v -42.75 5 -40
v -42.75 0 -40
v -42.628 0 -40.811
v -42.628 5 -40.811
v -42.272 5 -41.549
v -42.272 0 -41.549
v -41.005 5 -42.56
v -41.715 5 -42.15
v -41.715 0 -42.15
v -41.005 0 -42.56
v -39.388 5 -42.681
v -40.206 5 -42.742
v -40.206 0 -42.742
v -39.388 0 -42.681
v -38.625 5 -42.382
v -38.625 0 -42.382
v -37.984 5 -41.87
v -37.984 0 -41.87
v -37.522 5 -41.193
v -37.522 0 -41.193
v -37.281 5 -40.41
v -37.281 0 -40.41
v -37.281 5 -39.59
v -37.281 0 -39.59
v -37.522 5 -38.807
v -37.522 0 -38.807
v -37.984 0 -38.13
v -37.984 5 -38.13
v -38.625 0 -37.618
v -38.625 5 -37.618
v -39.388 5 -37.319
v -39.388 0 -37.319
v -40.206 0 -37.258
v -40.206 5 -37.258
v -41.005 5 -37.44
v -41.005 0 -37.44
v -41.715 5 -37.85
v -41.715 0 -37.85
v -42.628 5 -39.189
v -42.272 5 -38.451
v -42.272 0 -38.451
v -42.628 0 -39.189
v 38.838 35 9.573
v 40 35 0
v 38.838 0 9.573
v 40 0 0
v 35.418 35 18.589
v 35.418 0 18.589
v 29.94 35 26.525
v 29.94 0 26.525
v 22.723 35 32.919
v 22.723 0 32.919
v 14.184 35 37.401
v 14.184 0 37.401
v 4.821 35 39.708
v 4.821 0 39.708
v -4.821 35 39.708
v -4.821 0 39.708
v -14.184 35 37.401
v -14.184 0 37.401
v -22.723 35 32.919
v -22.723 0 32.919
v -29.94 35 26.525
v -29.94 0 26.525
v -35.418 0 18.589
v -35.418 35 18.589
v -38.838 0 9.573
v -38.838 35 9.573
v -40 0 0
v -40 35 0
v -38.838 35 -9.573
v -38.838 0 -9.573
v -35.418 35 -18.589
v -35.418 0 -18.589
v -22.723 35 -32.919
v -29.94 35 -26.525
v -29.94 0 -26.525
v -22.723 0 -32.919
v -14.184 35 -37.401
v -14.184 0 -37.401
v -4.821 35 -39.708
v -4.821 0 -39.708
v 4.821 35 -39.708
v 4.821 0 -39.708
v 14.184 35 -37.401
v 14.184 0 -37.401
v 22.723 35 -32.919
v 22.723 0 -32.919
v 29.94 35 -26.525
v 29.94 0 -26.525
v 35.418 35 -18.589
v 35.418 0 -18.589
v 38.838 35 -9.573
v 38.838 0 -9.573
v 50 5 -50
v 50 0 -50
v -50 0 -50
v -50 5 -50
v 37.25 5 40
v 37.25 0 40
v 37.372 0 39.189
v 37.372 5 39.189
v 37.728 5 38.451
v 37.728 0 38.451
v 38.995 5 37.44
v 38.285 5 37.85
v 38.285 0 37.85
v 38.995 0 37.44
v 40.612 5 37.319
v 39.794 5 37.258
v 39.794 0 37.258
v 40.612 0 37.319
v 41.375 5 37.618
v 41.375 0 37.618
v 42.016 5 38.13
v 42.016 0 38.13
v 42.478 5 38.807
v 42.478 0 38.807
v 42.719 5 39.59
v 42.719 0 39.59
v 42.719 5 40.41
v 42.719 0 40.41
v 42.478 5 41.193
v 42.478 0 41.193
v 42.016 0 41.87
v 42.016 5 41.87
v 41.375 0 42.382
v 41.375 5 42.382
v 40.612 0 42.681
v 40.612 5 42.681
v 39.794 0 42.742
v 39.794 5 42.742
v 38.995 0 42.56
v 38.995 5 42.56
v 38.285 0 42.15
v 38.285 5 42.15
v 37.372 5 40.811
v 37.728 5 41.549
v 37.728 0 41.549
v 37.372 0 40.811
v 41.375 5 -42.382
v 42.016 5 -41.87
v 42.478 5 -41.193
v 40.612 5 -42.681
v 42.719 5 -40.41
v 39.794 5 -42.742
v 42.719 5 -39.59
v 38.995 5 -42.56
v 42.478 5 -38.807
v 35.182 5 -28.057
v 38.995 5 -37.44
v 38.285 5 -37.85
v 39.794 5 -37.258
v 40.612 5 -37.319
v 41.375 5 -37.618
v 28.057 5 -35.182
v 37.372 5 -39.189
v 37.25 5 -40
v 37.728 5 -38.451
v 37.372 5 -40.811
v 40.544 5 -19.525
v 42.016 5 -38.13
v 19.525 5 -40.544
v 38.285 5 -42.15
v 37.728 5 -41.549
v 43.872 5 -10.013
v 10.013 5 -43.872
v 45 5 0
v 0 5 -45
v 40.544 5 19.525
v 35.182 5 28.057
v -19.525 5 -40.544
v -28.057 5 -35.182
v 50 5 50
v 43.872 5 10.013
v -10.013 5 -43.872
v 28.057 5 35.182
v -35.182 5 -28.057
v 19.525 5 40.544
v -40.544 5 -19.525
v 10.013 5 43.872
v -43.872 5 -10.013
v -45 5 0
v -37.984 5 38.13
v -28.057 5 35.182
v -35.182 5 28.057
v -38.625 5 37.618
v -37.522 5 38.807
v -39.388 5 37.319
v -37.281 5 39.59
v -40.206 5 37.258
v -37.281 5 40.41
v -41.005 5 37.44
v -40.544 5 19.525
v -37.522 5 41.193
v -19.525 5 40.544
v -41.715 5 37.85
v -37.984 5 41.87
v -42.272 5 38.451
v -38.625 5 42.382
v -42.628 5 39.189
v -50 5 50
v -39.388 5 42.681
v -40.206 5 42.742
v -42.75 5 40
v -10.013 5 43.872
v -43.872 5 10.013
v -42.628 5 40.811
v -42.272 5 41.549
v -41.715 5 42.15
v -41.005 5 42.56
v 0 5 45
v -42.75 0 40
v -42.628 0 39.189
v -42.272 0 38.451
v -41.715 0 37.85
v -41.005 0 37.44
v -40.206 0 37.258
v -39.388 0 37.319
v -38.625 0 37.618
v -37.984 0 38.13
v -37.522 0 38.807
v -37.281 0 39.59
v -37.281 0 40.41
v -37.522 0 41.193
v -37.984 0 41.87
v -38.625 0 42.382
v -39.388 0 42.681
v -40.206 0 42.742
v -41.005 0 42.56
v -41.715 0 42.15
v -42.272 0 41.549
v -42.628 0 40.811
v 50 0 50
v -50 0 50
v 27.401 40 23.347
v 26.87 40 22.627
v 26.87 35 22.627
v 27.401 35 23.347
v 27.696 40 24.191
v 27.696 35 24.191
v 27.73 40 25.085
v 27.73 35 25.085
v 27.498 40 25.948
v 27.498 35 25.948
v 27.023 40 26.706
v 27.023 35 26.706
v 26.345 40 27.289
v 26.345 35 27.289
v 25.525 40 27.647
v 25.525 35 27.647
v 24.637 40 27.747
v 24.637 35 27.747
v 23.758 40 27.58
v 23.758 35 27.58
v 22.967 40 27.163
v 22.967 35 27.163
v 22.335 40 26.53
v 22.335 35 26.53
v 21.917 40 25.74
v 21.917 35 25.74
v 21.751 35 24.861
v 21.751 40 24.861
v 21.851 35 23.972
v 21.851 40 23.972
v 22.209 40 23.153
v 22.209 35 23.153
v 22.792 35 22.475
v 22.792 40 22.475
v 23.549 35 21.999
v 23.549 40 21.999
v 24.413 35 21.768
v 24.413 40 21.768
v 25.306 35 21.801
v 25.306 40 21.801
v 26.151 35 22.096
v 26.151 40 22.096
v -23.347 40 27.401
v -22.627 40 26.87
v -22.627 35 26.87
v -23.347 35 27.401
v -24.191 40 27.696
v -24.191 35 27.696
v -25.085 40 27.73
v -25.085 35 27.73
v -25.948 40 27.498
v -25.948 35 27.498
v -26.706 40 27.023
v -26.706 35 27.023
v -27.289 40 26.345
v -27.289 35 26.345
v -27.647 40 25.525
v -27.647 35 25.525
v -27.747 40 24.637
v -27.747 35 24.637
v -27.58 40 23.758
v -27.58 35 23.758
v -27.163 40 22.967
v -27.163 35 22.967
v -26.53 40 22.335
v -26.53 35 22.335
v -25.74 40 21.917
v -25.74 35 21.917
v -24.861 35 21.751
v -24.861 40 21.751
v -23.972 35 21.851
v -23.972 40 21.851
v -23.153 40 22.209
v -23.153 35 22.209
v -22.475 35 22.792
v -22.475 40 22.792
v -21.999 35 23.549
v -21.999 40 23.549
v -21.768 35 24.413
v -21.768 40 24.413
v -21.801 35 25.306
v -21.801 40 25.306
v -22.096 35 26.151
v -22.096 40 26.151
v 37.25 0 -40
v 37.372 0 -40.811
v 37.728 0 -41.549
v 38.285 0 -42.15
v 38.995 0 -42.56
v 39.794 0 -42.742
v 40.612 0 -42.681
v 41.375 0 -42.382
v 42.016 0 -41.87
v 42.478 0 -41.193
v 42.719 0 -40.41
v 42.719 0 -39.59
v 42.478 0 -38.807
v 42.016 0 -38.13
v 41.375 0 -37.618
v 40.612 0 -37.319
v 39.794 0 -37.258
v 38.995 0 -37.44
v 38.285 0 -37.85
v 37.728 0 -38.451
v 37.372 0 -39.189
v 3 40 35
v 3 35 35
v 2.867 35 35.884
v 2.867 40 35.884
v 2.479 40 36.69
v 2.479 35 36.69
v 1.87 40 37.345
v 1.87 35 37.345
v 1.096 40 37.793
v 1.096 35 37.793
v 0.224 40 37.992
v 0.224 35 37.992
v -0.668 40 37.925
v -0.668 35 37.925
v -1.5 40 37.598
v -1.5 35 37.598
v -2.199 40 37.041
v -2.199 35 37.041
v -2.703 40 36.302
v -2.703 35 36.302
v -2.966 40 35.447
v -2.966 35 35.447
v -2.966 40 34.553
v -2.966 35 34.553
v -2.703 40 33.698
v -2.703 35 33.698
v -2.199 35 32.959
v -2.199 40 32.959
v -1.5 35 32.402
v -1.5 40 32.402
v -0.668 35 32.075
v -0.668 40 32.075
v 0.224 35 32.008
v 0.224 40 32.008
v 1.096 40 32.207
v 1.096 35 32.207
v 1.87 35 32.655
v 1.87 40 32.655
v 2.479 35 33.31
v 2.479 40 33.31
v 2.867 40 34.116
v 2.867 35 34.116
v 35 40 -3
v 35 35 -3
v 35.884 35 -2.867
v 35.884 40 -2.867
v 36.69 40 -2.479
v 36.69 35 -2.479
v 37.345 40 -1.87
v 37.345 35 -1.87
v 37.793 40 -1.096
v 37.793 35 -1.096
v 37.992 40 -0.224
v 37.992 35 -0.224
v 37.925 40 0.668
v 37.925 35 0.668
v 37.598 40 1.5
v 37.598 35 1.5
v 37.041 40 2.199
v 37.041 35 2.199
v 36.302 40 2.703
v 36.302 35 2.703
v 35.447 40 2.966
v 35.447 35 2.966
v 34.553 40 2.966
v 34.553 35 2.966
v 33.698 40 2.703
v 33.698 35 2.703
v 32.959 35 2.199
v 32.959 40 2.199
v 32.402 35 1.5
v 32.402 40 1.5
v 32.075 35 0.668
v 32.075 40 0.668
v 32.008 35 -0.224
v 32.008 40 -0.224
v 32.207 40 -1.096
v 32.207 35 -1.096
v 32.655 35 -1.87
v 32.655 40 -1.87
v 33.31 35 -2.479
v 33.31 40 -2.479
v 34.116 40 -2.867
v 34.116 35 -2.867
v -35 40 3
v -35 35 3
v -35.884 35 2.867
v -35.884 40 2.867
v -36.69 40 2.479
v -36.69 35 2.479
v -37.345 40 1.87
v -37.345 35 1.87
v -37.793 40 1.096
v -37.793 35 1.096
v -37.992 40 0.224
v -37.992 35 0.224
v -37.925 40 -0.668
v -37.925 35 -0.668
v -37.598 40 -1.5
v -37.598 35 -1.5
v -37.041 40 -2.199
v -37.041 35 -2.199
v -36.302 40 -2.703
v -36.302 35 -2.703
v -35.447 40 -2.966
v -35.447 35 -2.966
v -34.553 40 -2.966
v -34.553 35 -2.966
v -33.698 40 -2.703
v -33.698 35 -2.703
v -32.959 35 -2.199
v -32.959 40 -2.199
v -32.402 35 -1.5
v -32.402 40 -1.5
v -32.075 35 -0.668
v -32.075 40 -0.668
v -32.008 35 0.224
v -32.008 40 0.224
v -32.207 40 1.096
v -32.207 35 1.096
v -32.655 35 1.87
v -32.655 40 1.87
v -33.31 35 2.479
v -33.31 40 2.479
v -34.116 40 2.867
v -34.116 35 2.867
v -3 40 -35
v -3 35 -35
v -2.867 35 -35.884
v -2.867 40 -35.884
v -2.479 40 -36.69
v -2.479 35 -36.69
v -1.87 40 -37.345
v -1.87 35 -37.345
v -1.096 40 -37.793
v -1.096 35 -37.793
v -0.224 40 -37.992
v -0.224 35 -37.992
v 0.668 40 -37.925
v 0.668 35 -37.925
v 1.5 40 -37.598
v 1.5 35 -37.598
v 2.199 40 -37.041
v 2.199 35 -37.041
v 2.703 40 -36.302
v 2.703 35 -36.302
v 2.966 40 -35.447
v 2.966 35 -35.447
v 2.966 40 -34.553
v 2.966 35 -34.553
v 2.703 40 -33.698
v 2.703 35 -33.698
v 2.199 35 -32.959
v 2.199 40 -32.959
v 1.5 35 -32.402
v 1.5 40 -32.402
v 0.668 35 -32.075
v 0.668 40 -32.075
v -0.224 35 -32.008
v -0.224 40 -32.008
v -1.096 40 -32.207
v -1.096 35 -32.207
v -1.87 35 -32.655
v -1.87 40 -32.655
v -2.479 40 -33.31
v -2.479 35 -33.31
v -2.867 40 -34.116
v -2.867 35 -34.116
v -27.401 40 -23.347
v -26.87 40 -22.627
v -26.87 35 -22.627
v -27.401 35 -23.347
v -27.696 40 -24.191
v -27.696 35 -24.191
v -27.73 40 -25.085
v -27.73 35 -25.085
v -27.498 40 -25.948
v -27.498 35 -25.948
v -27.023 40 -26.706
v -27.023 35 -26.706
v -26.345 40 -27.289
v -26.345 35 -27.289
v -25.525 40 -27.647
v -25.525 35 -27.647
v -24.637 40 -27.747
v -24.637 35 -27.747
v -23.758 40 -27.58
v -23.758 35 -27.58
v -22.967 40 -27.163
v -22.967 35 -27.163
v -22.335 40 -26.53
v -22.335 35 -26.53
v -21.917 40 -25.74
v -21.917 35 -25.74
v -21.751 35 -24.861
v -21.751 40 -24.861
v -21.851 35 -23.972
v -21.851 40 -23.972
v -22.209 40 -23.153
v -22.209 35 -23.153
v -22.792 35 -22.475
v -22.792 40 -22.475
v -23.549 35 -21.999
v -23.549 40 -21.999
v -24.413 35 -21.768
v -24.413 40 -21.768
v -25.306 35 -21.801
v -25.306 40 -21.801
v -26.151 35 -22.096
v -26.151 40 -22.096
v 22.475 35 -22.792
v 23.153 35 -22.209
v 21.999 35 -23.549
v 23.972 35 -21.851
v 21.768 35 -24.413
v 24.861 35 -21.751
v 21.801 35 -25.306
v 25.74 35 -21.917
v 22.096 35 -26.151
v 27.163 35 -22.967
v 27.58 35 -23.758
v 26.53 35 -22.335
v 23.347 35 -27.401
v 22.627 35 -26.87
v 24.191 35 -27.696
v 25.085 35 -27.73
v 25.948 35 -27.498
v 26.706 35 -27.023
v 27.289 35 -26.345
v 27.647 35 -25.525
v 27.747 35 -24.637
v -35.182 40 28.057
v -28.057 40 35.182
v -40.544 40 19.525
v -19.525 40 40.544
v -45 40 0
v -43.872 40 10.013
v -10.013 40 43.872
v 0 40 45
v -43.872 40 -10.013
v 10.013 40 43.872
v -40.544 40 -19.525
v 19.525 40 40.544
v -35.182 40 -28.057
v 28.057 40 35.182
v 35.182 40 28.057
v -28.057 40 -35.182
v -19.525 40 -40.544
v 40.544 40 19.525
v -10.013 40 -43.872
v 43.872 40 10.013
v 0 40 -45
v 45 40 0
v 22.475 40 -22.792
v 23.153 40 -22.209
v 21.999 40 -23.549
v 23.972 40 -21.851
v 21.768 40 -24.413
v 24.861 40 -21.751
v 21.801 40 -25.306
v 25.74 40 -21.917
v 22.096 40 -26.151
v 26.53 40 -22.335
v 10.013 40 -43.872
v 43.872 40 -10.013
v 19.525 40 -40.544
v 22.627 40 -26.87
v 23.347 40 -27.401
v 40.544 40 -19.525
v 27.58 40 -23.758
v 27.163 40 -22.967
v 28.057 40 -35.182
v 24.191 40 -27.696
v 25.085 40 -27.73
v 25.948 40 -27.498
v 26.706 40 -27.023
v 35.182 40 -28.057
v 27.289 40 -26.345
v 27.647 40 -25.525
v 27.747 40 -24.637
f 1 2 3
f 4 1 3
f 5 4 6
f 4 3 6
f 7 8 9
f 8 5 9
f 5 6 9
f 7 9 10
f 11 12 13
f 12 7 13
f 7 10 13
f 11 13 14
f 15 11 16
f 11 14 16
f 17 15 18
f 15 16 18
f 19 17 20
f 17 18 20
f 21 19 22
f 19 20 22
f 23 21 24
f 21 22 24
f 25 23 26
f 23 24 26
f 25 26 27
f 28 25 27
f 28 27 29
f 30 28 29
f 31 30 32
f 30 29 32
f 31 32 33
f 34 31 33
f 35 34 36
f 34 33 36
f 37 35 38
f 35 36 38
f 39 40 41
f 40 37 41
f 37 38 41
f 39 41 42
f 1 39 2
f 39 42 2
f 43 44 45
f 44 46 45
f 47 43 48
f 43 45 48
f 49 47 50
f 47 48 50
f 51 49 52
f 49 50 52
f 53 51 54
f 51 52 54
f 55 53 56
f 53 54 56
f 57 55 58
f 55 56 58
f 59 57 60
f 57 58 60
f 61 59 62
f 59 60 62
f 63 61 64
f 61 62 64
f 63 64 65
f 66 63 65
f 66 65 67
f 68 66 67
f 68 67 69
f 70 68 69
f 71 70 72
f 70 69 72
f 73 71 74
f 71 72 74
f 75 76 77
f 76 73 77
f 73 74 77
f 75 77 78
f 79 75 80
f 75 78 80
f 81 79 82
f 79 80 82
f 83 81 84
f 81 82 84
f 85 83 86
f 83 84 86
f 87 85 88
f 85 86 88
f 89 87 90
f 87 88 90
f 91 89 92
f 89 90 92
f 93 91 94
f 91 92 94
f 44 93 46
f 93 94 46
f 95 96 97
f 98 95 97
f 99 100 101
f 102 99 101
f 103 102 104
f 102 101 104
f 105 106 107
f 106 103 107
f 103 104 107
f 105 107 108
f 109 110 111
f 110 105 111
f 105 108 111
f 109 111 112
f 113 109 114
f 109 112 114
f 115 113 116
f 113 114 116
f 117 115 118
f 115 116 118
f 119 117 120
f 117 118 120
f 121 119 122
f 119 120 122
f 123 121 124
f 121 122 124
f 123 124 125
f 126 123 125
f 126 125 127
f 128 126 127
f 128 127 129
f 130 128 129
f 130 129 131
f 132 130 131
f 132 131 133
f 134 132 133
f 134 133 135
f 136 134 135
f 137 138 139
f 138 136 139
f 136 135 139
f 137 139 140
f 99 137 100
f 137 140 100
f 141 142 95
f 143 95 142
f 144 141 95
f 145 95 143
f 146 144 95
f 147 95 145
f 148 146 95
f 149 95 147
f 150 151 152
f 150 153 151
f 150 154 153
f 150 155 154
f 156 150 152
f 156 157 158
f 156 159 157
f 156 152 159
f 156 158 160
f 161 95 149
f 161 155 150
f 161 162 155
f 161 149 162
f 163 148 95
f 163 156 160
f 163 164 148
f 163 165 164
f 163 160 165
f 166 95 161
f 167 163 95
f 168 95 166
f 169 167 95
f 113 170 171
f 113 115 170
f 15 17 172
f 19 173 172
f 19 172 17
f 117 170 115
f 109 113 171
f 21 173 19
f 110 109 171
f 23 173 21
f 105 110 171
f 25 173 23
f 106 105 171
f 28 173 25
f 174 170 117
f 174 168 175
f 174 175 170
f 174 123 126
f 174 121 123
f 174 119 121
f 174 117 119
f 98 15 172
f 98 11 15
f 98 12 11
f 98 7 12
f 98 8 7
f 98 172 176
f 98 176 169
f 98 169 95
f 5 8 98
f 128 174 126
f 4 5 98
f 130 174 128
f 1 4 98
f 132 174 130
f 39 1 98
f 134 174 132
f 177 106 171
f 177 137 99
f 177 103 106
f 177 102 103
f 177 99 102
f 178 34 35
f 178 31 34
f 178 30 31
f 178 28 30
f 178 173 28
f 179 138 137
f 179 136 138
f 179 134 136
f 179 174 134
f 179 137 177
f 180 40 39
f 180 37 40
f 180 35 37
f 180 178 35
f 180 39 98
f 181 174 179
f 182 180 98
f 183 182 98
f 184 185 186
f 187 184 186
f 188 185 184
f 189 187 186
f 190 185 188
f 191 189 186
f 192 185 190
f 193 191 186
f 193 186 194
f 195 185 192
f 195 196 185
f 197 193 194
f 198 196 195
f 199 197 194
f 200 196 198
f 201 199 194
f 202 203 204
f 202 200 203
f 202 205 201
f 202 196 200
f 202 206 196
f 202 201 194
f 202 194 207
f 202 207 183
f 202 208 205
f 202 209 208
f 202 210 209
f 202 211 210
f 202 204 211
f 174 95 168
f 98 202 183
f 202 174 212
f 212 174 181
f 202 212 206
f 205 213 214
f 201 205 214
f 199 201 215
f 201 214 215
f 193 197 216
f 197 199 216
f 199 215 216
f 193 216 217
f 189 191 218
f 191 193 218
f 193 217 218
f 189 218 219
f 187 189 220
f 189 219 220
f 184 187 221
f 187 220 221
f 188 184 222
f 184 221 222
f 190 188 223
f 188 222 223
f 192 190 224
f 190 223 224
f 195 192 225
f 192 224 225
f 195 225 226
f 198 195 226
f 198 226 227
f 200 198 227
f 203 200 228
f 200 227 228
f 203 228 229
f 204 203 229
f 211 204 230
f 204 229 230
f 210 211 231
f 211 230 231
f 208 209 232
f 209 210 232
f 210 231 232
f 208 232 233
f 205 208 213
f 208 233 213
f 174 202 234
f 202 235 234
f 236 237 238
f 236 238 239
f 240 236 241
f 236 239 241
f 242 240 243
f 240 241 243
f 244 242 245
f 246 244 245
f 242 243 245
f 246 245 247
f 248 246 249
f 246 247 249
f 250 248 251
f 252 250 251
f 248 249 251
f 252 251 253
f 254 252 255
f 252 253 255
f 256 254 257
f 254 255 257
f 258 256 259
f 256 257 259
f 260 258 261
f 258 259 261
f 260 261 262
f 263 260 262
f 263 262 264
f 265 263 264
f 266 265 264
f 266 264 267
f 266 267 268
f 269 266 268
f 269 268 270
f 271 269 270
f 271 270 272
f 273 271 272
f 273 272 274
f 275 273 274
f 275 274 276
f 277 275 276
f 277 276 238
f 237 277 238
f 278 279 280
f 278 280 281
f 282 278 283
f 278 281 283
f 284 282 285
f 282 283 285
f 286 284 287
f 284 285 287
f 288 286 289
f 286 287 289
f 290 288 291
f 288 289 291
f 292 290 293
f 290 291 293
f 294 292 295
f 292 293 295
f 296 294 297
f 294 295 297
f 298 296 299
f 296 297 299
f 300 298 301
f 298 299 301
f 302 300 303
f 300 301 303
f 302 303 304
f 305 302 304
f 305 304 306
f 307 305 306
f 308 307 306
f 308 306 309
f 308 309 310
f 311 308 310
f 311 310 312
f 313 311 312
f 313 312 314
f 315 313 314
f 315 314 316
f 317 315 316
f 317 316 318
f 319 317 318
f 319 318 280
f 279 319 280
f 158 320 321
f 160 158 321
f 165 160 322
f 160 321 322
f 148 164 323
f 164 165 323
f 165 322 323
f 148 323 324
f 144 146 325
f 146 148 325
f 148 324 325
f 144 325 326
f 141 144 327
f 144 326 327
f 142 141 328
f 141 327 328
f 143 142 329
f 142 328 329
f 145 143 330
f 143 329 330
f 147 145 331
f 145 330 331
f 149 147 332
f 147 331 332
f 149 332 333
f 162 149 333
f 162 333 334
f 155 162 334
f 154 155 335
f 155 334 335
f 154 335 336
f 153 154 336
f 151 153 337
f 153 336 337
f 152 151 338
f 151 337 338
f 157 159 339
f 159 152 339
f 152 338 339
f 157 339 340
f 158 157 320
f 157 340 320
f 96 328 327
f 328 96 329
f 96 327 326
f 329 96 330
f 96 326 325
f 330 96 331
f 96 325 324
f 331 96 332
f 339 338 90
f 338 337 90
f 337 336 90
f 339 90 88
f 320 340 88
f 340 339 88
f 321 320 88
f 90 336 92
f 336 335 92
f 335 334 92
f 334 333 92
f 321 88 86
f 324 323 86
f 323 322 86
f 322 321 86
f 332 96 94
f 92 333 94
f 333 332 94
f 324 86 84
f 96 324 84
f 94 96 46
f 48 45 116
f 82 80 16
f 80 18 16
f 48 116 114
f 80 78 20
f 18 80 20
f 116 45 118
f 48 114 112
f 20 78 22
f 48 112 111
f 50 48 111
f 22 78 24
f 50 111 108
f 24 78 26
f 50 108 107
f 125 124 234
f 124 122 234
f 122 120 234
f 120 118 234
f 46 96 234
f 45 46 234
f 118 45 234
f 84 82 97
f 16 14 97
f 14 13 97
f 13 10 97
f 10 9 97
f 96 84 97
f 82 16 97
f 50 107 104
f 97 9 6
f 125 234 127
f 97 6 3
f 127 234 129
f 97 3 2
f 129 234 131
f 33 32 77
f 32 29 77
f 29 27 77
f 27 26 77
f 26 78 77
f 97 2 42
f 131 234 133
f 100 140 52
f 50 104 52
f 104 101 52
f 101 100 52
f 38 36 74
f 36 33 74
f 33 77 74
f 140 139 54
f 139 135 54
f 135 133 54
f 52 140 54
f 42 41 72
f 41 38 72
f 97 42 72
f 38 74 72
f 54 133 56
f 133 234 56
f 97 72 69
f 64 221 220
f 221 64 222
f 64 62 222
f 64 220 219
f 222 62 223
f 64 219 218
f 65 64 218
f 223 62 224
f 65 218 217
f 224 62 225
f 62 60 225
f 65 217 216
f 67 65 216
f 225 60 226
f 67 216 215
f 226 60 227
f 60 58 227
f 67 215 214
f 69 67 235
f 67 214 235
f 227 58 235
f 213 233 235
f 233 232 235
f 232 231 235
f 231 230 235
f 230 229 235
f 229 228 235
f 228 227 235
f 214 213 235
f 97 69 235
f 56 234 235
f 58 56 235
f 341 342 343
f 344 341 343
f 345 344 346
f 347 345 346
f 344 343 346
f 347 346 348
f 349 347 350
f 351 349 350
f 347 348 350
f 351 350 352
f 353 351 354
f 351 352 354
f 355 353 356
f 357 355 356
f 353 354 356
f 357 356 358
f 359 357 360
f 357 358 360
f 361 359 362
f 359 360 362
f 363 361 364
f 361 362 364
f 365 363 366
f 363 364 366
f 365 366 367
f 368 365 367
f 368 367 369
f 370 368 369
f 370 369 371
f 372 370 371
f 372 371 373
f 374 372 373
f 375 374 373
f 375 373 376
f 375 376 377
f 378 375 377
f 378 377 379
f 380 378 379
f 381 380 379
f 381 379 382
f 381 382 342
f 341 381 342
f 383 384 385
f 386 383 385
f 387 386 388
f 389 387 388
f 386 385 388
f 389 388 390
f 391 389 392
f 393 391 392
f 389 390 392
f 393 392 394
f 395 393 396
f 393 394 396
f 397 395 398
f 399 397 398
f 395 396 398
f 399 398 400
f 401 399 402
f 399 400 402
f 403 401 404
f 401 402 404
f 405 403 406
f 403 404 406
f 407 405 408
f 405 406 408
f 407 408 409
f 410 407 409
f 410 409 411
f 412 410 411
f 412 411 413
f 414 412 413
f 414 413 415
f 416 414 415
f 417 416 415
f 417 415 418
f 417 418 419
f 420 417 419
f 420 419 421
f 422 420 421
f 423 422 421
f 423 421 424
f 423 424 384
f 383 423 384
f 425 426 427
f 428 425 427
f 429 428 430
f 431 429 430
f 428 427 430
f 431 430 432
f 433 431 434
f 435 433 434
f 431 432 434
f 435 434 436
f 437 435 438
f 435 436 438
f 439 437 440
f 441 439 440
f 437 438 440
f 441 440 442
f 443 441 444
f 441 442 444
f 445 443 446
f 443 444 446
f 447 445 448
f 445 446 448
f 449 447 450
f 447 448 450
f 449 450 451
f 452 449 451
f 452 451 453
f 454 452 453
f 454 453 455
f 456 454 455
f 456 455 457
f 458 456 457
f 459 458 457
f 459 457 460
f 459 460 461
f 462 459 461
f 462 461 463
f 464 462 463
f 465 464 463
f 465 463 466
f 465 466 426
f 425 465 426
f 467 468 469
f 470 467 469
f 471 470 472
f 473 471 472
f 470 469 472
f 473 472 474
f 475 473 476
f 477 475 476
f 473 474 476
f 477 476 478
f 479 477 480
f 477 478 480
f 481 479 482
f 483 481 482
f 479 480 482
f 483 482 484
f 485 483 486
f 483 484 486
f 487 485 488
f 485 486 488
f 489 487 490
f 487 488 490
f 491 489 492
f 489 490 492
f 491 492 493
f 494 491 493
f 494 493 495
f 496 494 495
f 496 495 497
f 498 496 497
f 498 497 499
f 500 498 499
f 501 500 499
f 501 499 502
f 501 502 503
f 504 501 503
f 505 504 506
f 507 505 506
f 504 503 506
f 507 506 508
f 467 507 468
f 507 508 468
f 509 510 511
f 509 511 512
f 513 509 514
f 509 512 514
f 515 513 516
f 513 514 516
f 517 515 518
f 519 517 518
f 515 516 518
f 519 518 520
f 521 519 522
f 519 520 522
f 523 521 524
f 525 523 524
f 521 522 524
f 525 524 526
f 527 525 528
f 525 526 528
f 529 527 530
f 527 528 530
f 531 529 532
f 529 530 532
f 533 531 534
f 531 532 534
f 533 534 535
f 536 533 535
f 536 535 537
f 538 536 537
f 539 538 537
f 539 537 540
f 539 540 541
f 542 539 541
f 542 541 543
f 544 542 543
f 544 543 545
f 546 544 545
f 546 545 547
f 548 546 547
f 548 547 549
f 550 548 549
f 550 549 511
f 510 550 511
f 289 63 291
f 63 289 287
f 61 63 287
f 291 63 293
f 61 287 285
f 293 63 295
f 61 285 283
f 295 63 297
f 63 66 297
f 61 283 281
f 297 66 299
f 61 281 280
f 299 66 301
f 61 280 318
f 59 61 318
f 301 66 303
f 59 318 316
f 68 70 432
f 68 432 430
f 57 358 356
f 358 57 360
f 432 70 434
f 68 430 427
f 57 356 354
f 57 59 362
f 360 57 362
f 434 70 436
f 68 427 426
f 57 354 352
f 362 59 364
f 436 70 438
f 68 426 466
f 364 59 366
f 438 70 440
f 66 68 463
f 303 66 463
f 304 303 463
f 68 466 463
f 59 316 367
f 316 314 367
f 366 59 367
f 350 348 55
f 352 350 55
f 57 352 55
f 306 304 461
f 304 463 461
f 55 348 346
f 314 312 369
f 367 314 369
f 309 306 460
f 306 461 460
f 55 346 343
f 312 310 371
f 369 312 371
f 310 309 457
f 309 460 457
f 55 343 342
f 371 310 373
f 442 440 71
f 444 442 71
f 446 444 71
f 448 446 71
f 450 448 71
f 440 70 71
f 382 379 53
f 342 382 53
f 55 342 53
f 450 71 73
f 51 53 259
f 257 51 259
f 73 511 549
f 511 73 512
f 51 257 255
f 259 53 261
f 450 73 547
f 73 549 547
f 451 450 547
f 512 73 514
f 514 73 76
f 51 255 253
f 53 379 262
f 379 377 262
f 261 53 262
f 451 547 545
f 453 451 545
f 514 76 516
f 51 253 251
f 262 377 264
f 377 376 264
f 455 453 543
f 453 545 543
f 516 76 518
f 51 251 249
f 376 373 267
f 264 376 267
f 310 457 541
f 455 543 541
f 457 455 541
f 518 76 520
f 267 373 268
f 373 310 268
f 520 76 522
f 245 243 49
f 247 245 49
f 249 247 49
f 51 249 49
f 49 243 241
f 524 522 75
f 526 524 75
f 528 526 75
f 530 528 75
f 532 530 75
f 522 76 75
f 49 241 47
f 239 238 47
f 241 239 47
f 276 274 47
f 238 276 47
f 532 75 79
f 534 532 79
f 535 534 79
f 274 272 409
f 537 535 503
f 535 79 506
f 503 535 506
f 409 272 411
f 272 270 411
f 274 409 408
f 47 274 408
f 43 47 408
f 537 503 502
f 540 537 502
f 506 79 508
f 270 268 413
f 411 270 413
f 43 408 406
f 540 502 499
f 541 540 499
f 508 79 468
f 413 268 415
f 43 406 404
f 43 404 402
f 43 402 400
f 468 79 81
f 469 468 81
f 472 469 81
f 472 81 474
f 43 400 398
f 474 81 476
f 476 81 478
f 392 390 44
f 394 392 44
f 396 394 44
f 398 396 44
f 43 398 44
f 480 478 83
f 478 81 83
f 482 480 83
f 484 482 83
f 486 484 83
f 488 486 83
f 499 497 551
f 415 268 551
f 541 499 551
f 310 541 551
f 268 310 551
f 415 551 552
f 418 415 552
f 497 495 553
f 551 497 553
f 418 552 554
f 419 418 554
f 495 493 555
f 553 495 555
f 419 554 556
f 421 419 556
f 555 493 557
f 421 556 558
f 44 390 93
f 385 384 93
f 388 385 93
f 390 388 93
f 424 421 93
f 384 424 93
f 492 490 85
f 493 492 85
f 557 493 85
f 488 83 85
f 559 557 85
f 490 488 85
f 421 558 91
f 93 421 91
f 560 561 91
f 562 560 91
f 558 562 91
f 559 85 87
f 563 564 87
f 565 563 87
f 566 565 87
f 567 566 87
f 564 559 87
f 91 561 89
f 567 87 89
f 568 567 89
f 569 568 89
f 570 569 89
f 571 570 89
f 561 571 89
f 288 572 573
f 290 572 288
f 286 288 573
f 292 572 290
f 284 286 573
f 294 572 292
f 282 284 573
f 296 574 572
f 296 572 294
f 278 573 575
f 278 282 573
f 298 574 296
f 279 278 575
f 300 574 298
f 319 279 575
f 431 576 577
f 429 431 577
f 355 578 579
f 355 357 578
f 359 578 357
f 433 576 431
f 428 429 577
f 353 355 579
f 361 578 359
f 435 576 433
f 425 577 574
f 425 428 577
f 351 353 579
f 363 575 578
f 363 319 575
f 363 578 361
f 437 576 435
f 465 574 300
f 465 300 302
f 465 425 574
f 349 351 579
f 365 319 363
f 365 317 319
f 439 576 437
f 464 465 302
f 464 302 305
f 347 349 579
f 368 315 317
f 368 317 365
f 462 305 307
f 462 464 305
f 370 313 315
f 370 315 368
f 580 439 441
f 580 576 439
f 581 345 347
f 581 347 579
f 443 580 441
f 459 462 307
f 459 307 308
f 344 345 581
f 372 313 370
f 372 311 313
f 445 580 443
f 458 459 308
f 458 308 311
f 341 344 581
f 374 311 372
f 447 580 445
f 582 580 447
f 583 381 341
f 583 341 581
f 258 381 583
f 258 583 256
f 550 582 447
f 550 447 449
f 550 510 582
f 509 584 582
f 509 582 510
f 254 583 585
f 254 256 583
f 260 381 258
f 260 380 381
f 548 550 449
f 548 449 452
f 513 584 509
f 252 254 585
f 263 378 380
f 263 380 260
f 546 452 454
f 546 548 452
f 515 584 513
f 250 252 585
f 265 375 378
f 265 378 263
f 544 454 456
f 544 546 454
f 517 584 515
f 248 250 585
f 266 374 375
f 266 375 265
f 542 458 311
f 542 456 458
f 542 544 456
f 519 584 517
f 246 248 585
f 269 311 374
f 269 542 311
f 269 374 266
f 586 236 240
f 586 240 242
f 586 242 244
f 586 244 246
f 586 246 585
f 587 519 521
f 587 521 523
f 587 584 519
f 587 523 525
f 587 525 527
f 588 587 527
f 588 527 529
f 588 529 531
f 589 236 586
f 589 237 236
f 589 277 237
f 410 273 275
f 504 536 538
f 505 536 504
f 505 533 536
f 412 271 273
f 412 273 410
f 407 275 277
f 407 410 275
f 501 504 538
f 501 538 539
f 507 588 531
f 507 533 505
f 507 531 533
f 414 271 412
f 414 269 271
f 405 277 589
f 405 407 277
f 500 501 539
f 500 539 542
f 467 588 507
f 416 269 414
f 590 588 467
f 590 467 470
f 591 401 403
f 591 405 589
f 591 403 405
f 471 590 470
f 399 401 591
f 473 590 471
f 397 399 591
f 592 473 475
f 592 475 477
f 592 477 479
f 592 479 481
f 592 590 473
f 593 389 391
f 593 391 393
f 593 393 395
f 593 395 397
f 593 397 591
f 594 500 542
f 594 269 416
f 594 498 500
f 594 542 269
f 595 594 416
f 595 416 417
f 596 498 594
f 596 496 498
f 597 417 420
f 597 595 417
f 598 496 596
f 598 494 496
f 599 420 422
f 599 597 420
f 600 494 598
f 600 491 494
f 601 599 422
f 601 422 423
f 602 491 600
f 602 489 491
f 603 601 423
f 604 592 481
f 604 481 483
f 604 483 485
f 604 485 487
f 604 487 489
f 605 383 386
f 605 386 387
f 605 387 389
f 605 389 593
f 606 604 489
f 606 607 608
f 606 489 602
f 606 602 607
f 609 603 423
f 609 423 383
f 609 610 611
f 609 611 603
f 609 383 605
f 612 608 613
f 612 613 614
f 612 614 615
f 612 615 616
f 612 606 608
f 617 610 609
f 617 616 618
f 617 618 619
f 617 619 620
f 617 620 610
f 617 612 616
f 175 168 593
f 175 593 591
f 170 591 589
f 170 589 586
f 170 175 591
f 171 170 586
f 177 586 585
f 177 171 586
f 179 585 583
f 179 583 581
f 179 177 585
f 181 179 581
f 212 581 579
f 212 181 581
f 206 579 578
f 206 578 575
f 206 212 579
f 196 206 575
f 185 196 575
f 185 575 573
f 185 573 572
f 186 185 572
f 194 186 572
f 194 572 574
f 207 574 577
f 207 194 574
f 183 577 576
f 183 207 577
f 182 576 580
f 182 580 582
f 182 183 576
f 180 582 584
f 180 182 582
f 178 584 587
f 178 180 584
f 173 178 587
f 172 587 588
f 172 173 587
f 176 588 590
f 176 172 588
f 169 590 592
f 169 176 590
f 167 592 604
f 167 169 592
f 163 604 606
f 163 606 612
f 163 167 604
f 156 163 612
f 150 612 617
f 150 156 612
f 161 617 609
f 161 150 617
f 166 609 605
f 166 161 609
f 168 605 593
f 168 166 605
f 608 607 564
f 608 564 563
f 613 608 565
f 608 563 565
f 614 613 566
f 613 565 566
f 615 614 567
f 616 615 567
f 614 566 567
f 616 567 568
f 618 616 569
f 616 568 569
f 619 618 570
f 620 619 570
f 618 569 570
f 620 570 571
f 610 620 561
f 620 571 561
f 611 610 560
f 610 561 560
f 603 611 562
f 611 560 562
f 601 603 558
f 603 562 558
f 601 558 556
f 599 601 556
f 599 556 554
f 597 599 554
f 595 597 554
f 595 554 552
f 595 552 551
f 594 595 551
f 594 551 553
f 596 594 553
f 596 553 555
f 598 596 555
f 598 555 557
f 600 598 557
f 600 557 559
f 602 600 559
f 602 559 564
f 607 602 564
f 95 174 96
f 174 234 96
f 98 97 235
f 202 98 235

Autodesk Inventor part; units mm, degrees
ref_plane "YZ Plane" through (0, 0, 0) normal (1, 0, 0) x (0, 1, 0)
ref_plane "XZ Plane" through (0, 0, 0) normal (0, 1, 0) x (-1, 0, 0)
ref_plane "XY Plane" through (0, 0, 0) normal (0, 0, 1) x (1, 0, 0)
sketch "Sketch1" plane through (0, 0, 0) normal (0, 1, 0) x (-1, 0, 0)
  line L0 (50, 50) -> (-50, 50)
  line L1 (-50, 50) -> (-50, -50)
  line L2 (-50, -50) -> (50, -50)
  line L3 (50, -50) -> (50, 50)
  circle A0 centre (0, 0) radius 35
  circle A1 centre (40, 40) radius 2.75
  circle A2 centre (-40, 40) radius 2.75
  circle A3 centre (-40, -40) radius 2.75
  circle A4 centre (40, -40) radius 2.75
  point P0 (50, 0)
  point P1 (0, -50)
  dimension "d0" = 100
  dimension "d1" = 100
  dimension "d2" = 70
  dimension "d3" = 5.5
  dimension "d4" = 10
  dimension "d5" = 10
  dimension "d8" = 360
extrude "Extrusion1" add sketch "Sketch1" along normal blind 5
sketch "Sketch2" plane through (0, 0, 0) normal (0, -1, 0) x (1, 0, 0)
  circle A0 centre (0, 0) radius 45
  dimension "d12" = 90
extrude "Extrusion2" cut sketch "Sketch2" against normal blind 10
sketch "Sketch3" plane through (0, 0, 0) normal (0, -1, 0) x (1, 0, 0)
  circle A0 centre (0, 0) radius 45
  circle A1 centre (0, 0) radius 40
  dimension "d15" = 90
  dimension "d16" = 80
extrude "Extrusion3" add sketch "Sketch3" against normal blind 40
sketch "Sketch4" plane through (0, 40, 0) normal (0, 1, 0) x (1, 0, 0)
  circle A0 centre (0, 0) radius 40
extrude "Extrusion4" add sketch "Sketch4" against normal blind 5
sketch "Sketch5" plane through (0, 35, 0) normal (0, -1, 0) x (1, 0, 0)
  circle A0 centre (0, 35) radius 3
  point P0 (0, 0)
  dimension "d21" = 6
  dimension "d22" = 35
extrude "Extrusion5" cut sketch "Sketch5" against normal up to next
pattern_circular "Circular Pattern1" count 8 over 360 about axis through (0, 0, 0) along (0, 1, 0) of "Extrusion5"
properties part number "connector plate"
